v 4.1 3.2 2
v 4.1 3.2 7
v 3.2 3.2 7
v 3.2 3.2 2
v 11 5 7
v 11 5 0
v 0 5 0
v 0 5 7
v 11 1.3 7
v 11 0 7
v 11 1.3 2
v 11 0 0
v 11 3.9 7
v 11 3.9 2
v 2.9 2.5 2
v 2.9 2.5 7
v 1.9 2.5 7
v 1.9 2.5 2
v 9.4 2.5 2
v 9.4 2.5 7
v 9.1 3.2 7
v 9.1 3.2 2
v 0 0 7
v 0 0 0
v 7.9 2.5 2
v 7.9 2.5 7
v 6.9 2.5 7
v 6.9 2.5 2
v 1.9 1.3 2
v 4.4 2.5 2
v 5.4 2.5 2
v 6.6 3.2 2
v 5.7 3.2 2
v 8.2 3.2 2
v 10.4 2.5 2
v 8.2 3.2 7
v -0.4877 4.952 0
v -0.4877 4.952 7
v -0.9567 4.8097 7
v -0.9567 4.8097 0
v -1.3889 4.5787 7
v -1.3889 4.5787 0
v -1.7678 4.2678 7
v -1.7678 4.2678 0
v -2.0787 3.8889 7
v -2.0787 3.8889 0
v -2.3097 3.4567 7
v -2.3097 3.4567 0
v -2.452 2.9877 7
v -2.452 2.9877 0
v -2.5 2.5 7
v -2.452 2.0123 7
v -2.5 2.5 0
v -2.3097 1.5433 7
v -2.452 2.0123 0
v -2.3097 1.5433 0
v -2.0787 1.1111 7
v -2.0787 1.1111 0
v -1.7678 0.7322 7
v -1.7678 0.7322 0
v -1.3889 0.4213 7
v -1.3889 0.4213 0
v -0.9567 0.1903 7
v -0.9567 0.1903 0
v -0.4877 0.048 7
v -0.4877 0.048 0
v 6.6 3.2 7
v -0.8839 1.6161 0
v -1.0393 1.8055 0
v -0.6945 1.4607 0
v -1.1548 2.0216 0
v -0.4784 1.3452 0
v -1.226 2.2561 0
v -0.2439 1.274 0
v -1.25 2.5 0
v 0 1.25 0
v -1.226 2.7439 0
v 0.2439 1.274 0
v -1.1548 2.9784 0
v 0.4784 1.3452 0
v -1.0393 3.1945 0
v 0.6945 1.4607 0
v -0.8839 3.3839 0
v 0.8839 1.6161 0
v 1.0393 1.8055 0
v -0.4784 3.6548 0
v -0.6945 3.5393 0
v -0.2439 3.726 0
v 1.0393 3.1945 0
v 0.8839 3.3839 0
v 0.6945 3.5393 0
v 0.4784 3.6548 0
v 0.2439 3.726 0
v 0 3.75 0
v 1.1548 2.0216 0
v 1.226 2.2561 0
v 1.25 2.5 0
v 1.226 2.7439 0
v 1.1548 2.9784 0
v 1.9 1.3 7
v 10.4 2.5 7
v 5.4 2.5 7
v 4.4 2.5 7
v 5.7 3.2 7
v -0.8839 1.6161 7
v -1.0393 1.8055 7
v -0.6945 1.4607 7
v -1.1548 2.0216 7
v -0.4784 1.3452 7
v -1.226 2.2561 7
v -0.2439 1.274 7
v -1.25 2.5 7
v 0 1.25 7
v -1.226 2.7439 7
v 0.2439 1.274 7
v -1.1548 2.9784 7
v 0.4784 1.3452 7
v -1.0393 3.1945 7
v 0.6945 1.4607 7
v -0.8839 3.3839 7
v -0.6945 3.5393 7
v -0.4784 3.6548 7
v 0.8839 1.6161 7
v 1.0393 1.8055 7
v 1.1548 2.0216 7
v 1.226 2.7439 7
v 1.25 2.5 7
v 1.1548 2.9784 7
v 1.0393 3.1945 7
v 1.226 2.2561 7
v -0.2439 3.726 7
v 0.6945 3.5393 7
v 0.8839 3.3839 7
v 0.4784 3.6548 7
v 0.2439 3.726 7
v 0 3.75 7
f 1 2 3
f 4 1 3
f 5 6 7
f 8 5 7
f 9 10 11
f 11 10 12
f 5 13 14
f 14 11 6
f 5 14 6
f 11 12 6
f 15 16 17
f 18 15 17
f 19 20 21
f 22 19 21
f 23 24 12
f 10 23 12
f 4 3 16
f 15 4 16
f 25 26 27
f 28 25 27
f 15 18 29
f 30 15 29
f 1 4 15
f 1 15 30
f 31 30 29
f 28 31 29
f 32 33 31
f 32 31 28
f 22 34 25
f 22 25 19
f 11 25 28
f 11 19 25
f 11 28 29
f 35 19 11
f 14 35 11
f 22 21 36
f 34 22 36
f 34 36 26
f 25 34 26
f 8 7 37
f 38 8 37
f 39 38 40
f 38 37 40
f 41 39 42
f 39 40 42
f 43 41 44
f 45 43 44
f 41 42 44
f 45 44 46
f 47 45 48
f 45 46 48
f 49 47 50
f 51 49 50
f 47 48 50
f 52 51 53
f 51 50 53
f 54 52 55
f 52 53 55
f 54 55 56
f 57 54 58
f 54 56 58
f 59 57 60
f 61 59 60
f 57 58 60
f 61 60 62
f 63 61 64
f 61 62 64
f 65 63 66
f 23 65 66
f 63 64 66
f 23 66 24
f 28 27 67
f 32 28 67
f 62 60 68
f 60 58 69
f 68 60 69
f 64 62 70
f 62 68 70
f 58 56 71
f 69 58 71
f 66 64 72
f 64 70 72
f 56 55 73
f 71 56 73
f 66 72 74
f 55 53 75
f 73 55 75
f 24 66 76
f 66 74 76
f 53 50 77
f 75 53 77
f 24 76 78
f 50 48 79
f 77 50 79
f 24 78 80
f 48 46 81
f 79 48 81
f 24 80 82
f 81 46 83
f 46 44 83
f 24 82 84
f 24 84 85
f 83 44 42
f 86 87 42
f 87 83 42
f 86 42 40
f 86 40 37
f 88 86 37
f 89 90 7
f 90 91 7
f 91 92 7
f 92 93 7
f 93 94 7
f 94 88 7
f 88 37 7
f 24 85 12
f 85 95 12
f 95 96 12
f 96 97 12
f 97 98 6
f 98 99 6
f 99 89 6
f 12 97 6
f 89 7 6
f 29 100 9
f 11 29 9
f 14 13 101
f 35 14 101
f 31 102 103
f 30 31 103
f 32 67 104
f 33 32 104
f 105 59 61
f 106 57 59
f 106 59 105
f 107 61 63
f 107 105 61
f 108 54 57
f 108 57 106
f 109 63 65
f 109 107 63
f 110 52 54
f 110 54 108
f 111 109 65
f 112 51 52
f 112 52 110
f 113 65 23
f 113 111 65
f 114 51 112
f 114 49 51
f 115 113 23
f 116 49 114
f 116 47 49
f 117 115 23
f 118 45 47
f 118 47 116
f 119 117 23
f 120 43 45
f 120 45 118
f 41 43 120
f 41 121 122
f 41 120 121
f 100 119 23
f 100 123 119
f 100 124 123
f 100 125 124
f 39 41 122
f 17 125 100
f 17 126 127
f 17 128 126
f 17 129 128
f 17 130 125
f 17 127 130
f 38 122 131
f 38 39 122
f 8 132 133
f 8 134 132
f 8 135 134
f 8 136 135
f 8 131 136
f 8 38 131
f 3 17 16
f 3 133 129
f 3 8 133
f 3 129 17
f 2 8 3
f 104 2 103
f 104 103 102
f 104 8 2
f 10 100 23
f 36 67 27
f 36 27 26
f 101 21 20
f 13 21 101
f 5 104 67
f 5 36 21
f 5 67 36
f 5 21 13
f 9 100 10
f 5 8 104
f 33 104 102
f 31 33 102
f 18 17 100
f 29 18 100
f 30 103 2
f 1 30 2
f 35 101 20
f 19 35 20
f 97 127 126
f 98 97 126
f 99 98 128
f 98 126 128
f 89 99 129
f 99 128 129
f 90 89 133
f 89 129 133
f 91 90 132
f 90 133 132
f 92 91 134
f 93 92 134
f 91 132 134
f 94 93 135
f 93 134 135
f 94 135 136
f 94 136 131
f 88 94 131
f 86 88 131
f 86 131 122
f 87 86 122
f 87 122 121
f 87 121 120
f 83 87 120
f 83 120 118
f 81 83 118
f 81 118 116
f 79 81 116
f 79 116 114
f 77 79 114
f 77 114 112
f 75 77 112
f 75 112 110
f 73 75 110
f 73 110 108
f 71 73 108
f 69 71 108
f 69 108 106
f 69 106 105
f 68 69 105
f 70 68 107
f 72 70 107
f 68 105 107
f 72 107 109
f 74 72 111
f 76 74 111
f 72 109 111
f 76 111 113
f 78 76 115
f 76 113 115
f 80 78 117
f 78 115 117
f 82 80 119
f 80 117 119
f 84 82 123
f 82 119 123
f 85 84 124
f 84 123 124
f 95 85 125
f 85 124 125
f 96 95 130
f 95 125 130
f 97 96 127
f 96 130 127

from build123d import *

# Parameters (mm, degrees)
BOSS_EXTRUDE1_DEPTH = 7
CUT_EXTRUDE1_DEPTH  = 5
SKETCH3_R           = 1.25
CUT_EXTRUDE2_DEPTH  = 8


with BuildPart() as part:
    # Sketch1 → Boss-Extrude1 (new body)
    with BuildSketch(Plane.XY):
        with BuildLine():
            Line((0, 0), (11, 0))
            Line((11, 0), (11, 5))
            Line((11, 5), (0, 5))
            ThreePointArc((0, 5), (-2.5, 2.5), (0, 0))
        make_face()
    extrude(amount=BOSS_EXTRUDE1_DEPTH)

    # Sketch2 → Cut-Extrude1 (cut)
    with BuildSketch(Plane.XY.offset(7)):
        Polygon((11, 3.9), (10.4, 2.5), (9.4, 2.5), (9.1, 3.2), (8.2, 3.2), (7.9, 2.5), (6.9, 2.5), (6.6, 3.2), (5.7, 3.2), (5.4, 2.5), (4.4, 2.5), (4.1, 3.2), (3.2, 3.2), (2.9, 2.5), (1.9, 2.5), (1.9, 1.3), (11, 1.3), align=None)
    extrude(amount=-CUT_EXTRUDE1_DEPTH, mode=Mode.SUBTRACT)

    # Sketch3 → Cut-Extrude2 (cut, through all)
    with BuildSketch(Plane.XY.offset(7)):
        with Locations((0, 2.5)):
            Circle(SKETCH3_R)
    extrude(amount=-CUT_EXTRUDE2_DEPTH, mode=Mode.SUBTRACT)


solid = part.part
